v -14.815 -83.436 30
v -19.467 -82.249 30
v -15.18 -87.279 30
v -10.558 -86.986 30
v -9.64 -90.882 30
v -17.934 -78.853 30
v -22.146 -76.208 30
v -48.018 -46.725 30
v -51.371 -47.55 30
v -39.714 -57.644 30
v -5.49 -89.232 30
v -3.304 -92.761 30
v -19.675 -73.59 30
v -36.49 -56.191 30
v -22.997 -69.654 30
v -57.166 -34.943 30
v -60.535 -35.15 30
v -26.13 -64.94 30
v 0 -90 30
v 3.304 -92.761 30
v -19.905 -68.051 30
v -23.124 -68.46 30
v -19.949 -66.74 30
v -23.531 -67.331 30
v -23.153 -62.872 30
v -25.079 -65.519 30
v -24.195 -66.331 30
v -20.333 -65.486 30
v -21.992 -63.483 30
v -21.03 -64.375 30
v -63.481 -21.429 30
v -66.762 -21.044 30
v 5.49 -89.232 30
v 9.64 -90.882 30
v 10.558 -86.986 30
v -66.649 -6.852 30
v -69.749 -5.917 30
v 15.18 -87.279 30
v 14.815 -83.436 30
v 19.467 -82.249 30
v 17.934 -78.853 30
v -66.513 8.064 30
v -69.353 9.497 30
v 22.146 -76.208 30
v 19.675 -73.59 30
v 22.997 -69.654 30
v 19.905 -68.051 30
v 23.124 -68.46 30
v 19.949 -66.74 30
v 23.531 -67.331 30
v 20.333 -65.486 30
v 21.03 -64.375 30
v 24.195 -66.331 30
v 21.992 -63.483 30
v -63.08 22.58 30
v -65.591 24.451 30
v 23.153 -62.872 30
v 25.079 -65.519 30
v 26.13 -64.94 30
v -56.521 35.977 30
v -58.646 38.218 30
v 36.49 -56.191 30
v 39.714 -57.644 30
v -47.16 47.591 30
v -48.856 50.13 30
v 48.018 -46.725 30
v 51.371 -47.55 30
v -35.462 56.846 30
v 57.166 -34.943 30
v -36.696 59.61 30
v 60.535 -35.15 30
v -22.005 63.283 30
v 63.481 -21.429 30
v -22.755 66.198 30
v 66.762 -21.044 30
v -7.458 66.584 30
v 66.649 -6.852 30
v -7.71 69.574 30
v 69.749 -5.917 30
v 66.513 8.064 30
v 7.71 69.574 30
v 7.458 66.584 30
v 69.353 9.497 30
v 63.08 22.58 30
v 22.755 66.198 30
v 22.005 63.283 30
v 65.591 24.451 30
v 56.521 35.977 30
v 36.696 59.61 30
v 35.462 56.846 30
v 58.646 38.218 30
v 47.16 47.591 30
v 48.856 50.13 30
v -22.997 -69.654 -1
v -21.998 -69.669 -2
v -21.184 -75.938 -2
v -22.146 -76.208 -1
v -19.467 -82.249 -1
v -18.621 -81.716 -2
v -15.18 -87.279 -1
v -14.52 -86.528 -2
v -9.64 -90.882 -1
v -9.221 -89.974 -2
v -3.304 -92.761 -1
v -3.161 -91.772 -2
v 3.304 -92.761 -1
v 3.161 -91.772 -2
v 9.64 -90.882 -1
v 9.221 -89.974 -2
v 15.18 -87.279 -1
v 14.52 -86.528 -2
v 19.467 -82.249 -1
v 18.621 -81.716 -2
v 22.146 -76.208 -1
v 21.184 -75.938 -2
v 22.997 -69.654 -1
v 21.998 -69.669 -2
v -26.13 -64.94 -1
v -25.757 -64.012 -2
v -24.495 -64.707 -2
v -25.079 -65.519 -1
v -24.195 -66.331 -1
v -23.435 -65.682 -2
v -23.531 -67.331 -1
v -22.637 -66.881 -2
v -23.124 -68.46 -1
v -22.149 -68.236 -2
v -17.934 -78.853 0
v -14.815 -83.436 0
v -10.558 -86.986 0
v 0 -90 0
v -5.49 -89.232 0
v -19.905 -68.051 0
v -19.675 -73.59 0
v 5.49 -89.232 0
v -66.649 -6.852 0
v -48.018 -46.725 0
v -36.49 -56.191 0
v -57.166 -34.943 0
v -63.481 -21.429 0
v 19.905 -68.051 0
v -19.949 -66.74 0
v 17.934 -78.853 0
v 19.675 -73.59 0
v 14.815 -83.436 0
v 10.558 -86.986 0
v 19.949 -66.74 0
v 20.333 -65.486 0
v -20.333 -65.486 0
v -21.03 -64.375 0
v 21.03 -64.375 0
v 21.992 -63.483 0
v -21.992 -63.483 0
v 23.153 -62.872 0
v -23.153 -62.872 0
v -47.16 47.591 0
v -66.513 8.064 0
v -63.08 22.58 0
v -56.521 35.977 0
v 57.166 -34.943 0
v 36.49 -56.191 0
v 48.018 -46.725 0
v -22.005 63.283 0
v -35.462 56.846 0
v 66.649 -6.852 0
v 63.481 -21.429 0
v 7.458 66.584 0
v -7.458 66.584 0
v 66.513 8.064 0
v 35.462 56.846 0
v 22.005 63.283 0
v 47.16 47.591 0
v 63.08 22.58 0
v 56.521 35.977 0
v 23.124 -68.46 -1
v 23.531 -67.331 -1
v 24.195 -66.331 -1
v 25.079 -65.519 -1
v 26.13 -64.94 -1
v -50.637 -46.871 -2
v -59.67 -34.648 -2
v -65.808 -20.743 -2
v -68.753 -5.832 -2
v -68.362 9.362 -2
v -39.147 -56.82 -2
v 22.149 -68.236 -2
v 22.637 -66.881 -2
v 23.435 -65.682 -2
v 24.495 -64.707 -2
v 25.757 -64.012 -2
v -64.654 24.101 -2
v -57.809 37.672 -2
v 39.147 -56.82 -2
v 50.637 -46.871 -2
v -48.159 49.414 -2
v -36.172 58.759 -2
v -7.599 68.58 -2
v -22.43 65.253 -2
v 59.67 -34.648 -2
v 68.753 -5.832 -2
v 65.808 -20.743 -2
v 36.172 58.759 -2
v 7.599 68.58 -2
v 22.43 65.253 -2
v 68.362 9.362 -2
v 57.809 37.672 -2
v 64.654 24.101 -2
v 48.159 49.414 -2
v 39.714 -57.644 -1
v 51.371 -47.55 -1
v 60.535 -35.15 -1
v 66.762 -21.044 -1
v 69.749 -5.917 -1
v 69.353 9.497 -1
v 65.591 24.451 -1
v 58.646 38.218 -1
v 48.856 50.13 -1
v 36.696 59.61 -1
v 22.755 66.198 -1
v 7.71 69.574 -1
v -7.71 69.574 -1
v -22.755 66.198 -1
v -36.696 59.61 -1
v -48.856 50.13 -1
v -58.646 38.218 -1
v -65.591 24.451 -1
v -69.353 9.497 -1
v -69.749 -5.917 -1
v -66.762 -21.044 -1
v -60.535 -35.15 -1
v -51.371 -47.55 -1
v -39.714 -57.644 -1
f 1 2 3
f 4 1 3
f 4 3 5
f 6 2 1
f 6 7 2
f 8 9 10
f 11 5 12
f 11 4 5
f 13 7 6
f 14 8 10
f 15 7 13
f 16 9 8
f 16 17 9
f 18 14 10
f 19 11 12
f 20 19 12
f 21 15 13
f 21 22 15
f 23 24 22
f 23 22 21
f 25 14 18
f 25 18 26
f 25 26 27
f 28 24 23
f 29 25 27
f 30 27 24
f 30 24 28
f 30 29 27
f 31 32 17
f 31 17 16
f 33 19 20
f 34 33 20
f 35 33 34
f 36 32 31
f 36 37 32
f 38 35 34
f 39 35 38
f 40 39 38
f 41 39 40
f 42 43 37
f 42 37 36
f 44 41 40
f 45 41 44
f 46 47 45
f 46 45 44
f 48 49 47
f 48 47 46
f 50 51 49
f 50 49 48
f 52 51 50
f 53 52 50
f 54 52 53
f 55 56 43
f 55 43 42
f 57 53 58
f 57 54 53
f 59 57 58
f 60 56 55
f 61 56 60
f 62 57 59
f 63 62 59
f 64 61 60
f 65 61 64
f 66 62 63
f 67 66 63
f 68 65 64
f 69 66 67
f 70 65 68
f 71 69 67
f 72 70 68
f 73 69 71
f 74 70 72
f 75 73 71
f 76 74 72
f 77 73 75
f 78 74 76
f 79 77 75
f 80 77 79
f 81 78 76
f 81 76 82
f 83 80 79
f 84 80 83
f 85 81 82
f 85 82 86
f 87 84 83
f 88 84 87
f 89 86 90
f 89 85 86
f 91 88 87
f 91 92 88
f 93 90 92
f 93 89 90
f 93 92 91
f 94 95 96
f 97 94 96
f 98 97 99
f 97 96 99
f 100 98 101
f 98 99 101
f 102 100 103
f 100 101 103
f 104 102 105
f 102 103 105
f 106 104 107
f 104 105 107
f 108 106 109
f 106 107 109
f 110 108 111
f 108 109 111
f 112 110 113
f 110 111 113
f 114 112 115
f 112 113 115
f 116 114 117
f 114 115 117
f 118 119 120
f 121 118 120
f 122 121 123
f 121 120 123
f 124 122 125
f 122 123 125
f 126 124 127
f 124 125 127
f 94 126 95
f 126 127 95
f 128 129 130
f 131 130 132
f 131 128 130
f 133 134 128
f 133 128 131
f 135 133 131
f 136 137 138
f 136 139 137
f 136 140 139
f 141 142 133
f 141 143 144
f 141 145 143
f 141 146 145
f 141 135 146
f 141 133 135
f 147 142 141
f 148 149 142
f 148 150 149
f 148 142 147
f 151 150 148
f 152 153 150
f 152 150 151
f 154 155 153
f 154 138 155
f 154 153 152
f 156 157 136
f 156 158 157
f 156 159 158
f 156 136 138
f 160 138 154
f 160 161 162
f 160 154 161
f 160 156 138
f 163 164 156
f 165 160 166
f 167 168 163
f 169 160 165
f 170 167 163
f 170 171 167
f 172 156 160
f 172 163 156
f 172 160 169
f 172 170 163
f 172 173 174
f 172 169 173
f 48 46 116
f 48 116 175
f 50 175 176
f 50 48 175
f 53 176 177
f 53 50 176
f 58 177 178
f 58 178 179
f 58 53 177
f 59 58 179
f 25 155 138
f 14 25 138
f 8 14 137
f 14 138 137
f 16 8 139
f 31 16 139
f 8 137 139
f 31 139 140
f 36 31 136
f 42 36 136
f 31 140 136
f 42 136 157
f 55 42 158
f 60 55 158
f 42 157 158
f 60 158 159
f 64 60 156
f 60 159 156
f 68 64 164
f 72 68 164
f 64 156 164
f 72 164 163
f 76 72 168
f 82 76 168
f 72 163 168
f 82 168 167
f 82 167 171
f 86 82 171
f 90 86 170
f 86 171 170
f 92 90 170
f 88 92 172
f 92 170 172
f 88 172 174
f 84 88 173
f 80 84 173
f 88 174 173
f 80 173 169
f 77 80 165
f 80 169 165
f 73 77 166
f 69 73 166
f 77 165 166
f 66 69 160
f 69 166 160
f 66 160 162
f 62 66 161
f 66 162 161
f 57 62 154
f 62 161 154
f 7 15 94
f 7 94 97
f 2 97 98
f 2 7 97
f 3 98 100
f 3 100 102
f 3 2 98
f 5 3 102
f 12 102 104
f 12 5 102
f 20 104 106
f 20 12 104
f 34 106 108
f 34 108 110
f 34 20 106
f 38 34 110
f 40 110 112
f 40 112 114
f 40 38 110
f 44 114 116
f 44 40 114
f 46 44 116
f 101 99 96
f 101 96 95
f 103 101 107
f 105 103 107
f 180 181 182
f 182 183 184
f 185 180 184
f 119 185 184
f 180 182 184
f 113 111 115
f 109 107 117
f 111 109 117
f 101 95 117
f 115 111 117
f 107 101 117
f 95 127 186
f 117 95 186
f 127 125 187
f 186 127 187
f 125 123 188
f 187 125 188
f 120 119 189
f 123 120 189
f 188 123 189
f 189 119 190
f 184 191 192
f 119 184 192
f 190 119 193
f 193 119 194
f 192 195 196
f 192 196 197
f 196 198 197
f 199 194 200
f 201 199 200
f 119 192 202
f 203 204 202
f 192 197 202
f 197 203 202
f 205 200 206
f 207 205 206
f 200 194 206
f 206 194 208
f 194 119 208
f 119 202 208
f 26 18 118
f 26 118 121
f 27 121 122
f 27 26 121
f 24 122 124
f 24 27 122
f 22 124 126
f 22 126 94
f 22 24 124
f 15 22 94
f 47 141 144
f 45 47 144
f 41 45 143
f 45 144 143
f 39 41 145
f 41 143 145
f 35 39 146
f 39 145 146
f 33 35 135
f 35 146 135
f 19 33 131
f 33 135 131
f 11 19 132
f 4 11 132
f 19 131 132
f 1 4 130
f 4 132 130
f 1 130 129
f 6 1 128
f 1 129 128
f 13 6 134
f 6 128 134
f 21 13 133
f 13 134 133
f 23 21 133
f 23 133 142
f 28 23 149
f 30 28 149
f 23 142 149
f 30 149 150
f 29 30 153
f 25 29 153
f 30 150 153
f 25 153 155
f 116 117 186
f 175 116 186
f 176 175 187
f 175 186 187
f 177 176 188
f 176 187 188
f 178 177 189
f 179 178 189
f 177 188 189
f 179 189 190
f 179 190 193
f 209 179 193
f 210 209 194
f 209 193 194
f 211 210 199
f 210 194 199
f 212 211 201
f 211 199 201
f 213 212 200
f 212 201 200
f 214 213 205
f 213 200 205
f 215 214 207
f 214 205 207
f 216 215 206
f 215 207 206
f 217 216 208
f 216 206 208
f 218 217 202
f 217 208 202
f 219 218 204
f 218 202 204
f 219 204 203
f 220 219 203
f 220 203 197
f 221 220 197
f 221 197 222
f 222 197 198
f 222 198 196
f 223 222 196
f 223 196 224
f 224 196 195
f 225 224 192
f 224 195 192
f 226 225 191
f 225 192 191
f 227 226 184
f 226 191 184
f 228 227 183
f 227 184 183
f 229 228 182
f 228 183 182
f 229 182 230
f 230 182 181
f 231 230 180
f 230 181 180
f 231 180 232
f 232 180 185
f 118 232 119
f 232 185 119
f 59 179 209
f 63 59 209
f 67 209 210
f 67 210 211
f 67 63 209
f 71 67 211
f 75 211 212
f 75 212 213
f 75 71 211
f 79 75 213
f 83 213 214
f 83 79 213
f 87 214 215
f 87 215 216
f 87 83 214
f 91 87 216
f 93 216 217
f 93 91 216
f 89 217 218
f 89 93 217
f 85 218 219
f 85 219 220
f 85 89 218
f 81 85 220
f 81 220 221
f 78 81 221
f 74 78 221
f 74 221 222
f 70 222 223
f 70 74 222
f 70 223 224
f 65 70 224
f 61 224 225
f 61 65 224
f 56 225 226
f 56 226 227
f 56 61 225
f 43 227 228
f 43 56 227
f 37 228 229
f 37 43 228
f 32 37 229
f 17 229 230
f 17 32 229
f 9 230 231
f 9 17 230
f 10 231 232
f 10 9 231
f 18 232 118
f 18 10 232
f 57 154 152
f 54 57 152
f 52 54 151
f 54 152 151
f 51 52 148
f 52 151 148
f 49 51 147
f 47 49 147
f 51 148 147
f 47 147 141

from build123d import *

# Parameters (mm, degrees)
F1_DEPTH = 30
F3_DEPTH = 2
F4_SIZE  = 1


with BuildPart() as f1:
    # F0 (on Top) → F1 (new body)
    with BuildSketch(Plane.XY):
        with BuildLine():
            ThreePointArc((22.997395, -69.653827), (23.832678, -66.810928), (26.130373, -64.94))
            ThreePointArc((26.130373, -64.94), (0, 70), (-26.130373, -64.94))
            ThreePointArc((-26.130373, -64.94), (-23.832678, -66.810928), (-22.997395, -69.653827))
            ThreePointArc((-22.997395, -69.653827), (0, -93), (22.997395, -69.653827))
        make_face()
        with BuildLine():
            ThreePointArc((-23.153211, -62.872321), (0, 67), (23.153211, -62.872321))
            ThreePointArc((23.153211, -62.872321), (20.645274, -64.907579), (19.90485, -68.051429))
            ThreePointArc((19.90485, -68.051429), (0, -90), (-19.90485, -68.051429))
            ThreePointArc((-19.90485, -68.051429), (-20.645274, -64.907579), (-23.153211, -62.872321))
        make_face(mode=Mode.SUBTRACT)
    extrude(amount=F1_DEPTH)

    # F2 (on Top) → F3 (join)
    with BuildSketch(Plane.XY):
        with BuildLine():
            ThreePointArc((22.997395, -69.653827), (23.832678, -66.810928), (26.130373, -64.94))
            ThreePointArc((26.130373, -64.94), (0, 70), (-26.130373, -64.94))
            ThreePointArc((-26.130373, -64.94), (-23.832678, -66.810928), (-22.997395, -69.653827))
            ThreePointArc((-22.997395, -69.653827), (0, -93), (22.997395, -69.653827))
        make_face()
    extrude(amount=-F3_DEPTH)

    # F4
    f4_edges = [f1.edges().sort_by_distance(p)[0] for p in [
        (0, 70, -2),
    ]]
    chamfer(f4_edges, length=F4_SIZE)


solid = f1.part
